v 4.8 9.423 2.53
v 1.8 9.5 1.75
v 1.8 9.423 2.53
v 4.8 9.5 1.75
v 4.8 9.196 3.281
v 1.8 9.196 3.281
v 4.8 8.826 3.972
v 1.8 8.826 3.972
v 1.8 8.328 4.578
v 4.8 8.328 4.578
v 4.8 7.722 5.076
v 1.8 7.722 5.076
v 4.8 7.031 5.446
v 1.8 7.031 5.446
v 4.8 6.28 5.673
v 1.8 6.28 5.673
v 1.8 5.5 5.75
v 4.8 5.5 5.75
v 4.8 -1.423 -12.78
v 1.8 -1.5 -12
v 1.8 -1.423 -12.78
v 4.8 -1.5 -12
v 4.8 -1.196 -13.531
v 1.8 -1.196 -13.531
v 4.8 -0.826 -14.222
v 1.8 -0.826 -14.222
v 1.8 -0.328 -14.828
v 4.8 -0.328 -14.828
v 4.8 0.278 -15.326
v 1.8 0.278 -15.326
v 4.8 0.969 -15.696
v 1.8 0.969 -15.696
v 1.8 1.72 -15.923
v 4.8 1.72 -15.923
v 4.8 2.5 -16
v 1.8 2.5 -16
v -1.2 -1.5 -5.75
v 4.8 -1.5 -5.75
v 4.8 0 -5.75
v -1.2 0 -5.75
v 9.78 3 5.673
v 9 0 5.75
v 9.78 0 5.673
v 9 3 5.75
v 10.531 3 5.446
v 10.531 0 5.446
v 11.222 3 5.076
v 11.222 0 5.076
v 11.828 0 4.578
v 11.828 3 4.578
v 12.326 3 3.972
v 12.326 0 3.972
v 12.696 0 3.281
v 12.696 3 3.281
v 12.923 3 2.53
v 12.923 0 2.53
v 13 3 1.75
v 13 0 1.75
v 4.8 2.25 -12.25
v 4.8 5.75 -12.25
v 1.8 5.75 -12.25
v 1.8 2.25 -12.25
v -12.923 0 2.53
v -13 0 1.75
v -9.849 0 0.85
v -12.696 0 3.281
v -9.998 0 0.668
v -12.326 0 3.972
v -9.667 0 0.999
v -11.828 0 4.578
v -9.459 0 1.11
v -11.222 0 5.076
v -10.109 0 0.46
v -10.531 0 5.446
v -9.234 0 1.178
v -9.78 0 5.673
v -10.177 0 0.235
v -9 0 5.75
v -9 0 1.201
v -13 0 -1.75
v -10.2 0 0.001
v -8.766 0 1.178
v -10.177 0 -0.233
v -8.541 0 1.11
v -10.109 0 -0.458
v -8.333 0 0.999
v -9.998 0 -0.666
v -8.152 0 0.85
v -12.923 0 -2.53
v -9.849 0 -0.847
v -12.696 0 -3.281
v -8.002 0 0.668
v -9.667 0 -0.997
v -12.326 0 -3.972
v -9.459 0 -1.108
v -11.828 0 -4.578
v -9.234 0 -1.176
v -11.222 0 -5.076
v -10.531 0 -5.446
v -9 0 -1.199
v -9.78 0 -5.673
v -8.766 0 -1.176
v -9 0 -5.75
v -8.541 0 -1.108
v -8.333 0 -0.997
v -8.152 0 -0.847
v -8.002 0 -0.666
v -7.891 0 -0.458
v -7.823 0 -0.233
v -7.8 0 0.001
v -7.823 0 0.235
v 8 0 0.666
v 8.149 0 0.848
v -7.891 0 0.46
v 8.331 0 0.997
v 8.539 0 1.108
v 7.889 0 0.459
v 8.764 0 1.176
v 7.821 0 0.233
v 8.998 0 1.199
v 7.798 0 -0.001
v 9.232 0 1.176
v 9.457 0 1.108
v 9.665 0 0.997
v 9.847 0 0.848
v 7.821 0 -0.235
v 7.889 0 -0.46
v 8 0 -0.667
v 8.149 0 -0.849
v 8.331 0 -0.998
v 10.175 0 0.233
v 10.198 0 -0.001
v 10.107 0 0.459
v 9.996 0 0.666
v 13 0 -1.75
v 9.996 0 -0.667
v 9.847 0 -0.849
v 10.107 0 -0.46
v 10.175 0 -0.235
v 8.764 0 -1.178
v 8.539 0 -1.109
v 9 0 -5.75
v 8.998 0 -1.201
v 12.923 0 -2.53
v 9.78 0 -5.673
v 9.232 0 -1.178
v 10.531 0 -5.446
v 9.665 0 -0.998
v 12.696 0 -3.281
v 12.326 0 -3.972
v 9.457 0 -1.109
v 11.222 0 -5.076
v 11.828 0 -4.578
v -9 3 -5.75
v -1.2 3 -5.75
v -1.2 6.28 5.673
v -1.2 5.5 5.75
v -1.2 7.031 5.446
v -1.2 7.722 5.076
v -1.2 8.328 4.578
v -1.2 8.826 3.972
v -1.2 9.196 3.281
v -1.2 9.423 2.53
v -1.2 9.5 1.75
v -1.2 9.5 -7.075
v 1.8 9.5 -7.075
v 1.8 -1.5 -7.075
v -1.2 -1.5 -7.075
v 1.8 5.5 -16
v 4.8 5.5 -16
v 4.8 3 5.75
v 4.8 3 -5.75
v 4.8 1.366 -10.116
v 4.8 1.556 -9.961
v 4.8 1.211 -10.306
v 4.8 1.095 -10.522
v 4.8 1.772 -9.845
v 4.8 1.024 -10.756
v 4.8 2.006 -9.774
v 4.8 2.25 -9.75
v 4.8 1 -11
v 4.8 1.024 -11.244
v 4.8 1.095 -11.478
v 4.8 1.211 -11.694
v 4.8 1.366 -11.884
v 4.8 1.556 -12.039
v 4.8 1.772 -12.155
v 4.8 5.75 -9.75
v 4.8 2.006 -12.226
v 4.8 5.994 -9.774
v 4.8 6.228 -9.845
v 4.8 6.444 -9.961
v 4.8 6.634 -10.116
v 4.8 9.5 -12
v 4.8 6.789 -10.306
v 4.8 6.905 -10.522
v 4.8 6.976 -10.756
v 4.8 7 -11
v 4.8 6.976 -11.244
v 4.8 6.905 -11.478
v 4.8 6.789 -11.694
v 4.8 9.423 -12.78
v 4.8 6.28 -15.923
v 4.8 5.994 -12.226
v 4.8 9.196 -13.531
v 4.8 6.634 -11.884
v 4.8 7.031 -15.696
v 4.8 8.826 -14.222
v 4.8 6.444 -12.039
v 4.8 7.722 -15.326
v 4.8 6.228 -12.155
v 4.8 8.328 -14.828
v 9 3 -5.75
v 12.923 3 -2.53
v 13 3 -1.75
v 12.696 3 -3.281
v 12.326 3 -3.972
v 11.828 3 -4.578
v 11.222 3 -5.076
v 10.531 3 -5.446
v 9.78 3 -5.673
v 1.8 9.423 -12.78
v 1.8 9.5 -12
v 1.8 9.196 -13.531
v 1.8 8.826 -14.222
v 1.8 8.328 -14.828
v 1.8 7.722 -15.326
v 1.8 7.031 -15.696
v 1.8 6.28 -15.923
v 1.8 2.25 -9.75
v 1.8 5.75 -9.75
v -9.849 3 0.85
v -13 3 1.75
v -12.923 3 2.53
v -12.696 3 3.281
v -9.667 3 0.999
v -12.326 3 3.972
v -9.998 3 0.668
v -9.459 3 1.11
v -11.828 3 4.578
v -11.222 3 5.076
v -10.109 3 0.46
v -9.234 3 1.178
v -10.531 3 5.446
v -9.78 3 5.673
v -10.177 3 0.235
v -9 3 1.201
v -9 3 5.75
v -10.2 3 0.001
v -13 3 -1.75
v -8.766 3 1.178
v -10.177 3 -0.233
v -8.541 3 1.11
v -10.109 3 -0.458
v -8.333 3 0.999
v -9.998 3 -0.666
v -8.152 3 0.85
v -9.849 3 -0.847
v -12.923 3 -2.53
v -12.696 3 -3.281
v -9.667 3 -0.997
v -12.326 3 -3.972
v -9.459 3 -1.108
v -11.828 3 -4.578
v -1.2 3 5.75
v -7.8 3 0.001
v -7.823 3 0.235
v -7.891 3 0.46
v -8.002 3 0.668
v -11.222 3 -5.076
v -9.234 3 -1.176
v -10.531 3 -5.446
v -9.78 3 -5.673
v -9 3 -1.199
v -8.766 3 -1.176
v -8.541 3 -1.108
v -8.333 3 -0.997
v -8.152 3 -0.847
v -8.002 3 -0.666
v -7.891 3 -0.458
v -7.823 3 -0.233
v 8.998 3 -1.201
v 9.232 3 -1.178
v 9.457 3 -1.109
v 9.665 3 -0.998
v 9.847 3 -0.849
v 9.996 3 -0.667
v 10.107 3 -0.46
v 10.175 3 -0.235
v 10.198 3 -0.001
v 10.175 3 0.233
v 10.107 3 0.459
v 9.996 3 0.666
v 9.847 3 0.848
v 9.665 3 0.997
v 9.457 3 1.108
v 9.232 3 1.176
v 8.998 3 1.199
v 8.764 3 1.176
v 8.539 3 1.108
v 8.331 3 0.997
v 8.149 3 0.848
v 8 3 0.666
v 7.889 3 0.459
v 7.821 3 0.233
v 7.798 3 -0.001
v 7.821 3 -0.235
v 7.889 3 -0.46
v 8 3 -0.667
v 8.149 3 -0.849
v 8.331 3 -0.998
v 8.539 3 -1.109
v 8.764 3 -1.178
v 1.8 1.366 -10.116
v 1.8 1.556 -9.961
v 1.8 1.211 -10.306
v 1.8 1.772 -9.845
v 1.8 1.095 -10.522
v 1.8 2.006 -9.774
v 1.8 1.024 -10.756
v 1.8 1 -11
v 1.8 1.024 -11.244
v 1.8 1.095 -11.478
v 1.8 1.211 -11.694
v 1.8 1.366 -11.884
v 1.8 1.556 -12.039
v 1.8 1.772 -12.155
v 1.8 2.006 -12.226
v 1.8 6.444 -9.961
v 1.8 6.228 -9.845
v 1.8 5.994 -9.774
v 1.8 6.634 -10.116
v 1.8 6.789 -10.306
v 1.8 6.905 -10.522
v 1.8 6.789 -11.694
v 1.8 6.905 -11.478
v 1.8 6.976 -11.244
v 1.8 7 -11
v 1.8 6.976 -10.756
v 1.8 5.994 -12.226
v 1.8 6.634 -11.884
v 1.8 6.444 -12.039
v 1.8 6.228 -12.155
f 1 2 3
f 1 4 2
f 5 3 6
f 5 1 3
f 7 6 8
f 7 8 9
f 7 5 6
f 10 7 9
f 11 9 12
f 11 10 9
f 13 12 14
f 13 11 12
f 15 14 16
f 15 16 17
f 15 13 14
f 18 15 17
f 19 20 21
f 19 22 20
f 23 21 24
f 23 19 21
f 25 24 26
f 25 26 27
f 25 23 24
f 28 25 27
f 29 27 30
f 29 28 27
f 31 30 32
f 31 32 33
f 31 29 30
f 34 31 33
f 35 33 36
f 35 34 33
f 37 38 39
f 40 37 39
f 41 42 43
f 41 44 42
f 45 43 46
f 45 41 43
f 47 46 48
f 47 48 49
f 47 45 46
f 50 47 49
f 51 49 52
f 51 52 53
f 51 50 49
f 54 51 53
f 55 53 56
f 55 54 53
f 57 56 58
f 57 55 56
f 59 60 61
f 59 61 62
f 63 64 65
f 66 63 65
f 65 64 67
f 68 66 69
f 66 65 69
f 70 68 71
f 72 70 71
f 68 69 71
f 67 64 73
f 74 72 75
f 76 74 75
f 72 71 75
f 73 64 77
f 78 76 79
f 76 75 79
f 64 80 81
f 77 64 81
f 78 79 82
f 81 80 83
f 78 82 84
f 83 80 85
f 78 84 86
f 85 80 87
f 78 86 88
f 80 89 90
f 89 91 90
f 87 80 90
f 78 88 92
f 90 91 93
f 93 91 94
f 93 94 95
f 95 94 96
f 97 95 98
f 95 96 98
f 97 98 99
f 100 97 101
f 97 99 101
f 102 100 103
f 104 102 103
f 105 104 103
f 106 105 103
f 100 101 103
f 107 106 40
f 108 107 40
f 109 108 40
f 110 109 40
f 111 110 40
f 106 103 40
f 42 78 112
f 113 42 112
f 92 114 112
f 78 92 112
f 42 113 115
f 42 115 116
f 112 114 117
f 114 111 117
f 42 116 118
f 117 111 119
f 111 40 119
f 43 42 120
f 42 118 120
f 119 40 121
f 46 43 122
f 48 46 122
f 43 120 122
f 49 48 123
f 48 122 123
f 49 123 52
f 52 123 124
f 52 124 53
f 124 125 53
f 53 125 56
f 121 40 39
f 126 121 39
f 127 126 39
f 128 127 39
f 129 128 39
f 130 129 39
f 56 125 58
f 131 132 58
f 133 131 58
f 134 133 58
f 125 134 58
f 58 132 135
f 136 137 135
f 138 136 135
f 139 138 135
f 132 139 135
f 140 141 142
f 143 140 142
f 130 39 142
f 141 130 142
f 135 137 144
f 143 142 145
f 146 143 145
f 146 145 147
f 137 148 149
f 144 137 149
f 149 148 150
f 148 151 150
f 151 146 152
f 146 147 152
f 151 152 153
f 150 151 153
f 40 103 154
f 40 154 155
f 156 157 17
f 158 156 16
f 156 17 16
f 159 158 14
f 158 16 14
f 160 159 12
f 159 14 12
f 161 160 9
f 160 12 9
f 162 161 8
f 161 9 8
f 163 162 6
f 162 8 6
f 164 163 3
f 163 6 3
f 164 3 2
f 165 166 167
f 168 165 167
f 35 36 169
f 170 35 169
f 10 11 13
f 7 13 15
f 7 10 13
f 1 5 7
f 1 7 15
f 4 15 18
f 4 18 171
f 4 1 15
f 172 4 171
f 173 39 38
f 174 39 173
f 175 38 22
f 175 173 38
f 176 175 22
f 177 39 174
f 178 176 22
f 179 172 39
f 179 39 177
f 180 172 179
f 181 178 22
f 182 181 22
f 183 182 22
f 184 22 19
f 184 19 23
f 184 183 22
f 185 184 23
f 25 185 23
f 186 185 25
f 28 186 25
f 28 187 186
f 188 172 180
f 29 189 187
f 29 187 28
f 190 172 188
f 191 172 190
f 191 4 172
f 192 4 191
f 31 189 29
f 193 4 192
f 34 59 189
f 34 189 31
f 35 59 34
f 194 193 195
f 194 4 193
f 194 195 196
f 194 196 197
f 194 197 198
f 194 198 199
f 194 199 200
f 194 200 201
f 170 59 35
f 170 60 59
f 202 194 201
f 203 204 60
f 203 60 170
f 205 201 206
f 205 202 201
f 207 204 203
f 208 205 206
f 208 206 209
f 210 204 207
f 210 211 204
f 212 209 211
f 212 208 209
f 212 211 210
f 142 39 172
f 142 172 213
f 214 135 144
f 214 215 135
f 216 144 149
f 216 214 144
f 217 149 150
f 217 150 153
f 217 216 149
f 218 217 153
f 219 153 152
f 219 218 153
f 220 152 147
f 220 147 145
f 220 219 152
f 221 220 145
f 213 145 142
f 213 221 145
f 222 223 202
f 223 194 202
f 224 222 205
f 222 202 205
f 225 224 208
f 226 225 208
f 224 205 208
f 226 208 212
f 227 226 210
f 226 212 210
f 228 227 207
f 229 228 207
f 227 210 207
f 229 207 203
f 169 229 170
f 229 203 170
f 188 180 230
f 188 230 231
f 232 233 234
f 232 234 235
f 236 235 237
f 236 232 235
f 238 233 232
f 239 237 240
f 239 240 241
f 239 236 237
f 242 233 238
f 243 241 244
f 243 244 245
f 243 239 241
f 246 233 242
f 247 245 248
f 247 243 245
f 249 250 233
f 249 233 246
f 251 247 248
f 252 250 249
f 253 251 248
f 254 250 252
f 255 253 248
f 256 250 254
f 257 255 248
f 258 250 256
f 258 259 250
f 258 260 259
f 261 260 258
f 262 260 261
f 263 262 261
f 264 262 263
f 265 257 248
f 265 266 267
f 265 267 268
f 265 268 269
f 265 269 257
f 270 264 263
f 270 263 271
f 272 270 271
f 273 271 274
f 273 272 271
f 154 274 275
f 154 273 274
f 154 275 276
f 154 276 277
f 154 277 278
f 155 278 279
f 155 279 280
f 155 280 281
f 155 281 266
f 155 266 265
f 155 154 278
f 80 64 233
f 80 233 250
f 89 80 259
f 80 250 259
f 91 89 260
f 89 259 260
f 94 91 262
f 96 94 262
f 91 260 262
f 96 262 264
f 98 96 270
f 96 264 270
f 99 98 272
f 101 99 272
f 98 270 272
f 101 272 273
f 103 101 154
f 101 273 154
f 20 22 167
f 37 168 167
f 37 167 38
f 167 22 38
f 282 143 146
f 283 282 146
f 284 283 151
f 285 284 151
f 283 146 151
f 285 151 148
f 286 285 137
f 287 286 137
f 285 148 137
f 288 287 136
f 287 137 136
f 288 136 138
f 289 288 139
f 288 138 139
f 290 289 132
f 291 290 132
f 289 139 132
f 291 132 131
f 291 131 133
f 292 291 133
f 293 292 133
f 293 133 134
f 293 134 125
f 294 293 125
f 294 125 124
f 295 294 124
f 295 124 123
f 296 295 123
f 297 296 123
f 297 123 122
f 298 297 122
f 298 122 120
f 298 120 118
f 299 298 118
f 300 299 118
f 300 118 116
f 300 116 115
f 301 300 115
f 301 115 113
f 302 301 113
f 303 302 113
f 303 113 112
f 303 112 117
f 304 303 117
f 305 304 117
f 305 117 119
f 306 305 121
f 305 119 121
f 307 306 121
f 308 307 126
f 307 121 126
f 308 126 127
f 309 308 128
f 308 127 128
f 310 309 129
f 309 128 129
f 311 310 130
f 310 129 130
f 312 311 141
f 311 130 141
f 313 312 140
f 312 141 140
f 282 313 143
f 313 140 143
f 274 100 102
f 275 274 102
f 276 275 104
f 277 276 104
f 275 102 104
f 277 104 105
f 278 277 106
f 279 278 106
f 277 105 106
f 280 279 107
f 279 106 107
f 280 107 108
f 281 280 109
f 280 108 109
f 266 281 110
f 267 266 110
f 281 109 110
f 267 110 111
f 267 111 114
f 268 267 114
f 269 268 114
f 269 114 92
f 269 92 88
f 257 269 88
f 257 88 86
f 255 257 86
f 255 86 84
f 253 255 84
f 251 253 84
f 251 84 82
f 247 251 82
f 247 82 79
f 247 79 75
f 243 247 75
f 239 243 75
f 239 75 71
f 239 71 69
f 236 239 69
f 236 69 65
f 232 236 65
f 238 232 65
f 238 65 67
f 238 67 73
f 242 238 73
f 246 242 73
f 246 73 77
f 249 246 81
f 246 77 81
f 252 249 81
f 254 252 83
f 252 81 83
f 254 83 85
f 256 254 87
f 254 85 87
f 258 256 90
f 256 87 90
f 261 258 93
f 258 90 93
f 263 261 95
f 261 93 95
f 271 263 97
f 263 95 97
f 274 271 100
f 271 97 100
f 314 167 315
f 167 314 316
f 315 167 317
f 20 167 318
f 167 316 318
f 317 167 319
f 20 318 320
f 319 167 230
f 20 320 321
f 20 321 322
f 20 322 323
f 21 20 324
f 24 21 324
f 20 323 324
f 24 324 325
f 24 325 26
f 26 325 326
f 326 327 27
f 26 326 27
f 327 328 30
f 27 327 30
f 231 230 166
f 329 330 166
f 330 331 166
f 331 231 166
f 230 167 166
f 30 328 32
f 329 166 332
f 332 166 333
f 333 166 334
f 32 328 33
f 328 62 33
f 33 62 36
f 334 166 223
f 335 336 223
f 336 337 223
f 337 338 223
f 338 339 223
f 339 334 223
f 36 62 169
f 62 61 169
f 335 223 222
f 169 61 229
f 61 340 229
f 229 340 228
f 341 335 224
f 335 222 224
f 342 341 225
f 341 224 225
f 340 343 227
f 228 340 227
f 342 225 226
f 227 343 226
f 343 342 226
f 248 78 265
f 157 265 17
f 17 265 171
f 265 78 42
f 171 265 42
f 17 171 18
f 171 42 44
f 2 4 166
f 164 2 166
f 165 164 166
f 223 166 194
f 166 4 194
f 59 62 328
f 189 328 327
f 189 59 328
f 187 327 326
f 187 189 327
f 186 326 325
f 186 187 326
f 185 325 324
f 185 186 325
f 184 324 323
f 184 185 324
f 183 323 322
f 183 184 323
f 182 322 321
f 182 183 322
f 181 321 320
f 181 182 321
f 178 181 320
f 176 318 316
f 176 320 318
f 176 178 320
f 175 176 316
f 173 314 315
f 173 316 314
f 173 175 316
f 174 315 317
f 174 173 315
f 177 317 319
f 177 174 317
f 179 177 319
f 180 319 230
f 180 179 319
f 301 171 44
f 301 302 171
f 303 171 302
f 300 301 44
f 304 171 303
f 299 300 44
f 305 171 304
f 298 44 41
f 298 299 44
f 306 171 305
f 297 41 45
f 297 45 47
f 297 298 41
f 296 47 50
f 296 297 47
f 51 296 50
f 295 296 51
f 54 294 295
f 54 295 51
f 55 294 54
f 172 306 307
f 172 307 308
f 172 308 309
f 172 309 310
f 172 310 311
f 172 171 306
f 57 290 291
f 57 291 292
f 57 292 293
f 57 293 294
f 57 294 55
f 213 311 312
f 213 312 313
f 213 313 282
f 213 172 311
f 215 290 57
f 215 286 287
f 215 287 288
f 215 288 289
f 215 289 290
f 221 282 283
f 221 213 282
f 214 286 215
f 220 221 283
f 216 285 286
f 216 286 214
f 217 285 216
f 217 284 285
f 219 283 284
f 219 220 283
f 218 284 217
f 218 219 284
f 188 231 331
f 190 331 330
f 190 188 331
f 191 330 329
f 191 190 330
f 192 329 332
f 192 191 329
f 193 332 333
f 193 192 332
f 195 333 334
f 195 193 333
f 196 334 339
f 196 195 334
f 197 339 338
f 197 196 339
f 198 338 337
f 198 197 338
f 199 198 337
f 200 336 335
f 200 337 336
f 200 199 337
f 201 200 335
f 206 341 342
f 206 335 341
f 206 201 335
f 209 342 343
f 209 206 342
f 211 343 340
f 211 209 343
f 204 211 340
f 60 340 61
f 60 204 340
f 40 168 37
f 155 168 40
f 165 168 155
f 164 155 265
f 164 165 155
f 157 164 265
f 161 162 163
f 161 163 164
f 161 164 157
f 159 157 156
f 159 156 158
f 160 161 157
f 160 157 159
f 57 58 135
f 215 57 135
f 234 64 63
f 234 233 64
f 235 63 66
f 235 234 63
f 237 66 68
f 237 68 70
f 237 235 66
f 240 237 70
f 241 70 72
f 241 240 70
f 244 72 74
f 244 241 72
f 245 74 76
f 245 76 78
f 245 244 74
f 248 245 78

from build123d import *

# Parameters (mm, degrees)
SKETCH1_W           = 26
SKETCH1_H           = 11.5
BOSS_EXTRUDE1_DEPTH = 3
FILLET1_R           = 4
BOSS_EXTRUDE2_DEPTH = 3
FILLET2_R           = 4
BOSS_EXTRUDE3_DEPTH = 3
CUT_EXTRUDE2_DEPTH  = 4
FILLET3_R           = 4
SKETCH5_R           = 1.2
CUT_EXTRUDE3_DEPTH  = 4


with BuildPart() as part:
    # Sketch1 → Boss-Extrude1 (new body)
    with BuildSketch(Plane(origin=(0, 0, 0), x_dir=(1, 0, 0), z_dir=(0, 1, 0))):
        Rectangle(SKETCH1_W, SKETCH1_H)
    extrude(amount=BOSS_EXTRUDE1_DEPTH)

    # Fillet1
    fillet1_edges = [part.edges().sort_by_distance(p)[0] for p in [
        (13, 1.5, 5.75),
        (-13, 1.5, 5.75),
        (-13, 1.5, -5.75),
        (13, 1.5, -5.75),
    ]]
    fillet(fillet1_edges, radius=FILLET1_R)

    # Sketch2 → Boss-Extrude2 (add)
    with BuildSketch(Plane(origin=(1.8, 0, 0), x_dir=(0, 0, -1), z_dir=(1, 0, 0))):
        Polygon((0, 3), (5.75, 3), (5.75, -1.5), (16, -1.5), (16, 3), (16, 9.5), (0, 9.5), (-5.75, 9.5), (-5.75, 3), align=None)
    extrude(amount=BOSS_EXTRUDE2_DEPTH)

    # Fillet2
    fillet2_edges = [part.edges().sort_by_distance(p)[0] for p in [
        (3.3, 9.5, 5.75),
    ]]
    fillet(fillet2_edges, radius=FILLET2_R)

    # Sketch4 → Boss-Extrude3 (add)
    with BuildSketch(Plane.ZY.offset(-1.8)):
        with BuildLine():
            Line((-7.075, 9.5), (-7.075, -1.5))
            Line((-7.075, -1.5), (-5.75, -1.5))
            Line((-5.75, -1.5), (-5.75, 0))
            Line((-5.75, 0), (-5.75, 3))
            Line((-5.75, 3), (5.75, 3))
            Line((5.75, 3), (5.75, 5.5))
            ThreePointArc((5.75, 5.5), (4.578427125, 8.328427125), (1.75, 9.5))
            Line((1.75, 9.5), (-7.075, 9.5))
        make_face()
    extrude(amount=BOSS_EXTRUDE3_DEPTH)

    # Sketch3 → Cut-Extrude2 (cut)
    with BuildSketch(Plane(origin=(4.8, 0, 0), x_dir=(0, 0, -1), z_dir=(1, 0, 0))):
        with BuildLine():
            Line((9.75, 2.25), (9.75, 5.75))
            ThreePointArc((9.75, 5.75), (11, 7), (12.25, 5.75))
            Line((12.25, 5.75), (12.25, 2.25))
            ThreePointArc((12.25, 2.25), (11, 1), (9.75, 2.25))
        make_face()
    extrude(amount=-CUT_EXTRUDE2_DEPTH, mode=Mode.SUBTRACT)

    # Fillet3
    fillet3_edges = [part.edges().sort_by_distance(p)[0] for p in [
        (3.3, -1.5, -16),
        (3.3, 9.5, -16),
    ]]
    fillet(fillet3_edges, radius=FILLET3_R)

    # Sketch5 → Cut-Extrude3 (cut)
    with BuildSketch(Plane.XZ):
        with Locations(Location((8.997973452, -0.000616233, 0), (0, 0, 270))):
            Circle(SKETCH5_R)
        with Locations(Location((-9.000145119, 0.001069025, 0), (0, 0, 270))):
            Circle(SKETCH5_R)
    extrude(amount=-CUT_EXTRUDE3_DEPTH, mode=Mode.SUBTRACT)


solid = part.part
